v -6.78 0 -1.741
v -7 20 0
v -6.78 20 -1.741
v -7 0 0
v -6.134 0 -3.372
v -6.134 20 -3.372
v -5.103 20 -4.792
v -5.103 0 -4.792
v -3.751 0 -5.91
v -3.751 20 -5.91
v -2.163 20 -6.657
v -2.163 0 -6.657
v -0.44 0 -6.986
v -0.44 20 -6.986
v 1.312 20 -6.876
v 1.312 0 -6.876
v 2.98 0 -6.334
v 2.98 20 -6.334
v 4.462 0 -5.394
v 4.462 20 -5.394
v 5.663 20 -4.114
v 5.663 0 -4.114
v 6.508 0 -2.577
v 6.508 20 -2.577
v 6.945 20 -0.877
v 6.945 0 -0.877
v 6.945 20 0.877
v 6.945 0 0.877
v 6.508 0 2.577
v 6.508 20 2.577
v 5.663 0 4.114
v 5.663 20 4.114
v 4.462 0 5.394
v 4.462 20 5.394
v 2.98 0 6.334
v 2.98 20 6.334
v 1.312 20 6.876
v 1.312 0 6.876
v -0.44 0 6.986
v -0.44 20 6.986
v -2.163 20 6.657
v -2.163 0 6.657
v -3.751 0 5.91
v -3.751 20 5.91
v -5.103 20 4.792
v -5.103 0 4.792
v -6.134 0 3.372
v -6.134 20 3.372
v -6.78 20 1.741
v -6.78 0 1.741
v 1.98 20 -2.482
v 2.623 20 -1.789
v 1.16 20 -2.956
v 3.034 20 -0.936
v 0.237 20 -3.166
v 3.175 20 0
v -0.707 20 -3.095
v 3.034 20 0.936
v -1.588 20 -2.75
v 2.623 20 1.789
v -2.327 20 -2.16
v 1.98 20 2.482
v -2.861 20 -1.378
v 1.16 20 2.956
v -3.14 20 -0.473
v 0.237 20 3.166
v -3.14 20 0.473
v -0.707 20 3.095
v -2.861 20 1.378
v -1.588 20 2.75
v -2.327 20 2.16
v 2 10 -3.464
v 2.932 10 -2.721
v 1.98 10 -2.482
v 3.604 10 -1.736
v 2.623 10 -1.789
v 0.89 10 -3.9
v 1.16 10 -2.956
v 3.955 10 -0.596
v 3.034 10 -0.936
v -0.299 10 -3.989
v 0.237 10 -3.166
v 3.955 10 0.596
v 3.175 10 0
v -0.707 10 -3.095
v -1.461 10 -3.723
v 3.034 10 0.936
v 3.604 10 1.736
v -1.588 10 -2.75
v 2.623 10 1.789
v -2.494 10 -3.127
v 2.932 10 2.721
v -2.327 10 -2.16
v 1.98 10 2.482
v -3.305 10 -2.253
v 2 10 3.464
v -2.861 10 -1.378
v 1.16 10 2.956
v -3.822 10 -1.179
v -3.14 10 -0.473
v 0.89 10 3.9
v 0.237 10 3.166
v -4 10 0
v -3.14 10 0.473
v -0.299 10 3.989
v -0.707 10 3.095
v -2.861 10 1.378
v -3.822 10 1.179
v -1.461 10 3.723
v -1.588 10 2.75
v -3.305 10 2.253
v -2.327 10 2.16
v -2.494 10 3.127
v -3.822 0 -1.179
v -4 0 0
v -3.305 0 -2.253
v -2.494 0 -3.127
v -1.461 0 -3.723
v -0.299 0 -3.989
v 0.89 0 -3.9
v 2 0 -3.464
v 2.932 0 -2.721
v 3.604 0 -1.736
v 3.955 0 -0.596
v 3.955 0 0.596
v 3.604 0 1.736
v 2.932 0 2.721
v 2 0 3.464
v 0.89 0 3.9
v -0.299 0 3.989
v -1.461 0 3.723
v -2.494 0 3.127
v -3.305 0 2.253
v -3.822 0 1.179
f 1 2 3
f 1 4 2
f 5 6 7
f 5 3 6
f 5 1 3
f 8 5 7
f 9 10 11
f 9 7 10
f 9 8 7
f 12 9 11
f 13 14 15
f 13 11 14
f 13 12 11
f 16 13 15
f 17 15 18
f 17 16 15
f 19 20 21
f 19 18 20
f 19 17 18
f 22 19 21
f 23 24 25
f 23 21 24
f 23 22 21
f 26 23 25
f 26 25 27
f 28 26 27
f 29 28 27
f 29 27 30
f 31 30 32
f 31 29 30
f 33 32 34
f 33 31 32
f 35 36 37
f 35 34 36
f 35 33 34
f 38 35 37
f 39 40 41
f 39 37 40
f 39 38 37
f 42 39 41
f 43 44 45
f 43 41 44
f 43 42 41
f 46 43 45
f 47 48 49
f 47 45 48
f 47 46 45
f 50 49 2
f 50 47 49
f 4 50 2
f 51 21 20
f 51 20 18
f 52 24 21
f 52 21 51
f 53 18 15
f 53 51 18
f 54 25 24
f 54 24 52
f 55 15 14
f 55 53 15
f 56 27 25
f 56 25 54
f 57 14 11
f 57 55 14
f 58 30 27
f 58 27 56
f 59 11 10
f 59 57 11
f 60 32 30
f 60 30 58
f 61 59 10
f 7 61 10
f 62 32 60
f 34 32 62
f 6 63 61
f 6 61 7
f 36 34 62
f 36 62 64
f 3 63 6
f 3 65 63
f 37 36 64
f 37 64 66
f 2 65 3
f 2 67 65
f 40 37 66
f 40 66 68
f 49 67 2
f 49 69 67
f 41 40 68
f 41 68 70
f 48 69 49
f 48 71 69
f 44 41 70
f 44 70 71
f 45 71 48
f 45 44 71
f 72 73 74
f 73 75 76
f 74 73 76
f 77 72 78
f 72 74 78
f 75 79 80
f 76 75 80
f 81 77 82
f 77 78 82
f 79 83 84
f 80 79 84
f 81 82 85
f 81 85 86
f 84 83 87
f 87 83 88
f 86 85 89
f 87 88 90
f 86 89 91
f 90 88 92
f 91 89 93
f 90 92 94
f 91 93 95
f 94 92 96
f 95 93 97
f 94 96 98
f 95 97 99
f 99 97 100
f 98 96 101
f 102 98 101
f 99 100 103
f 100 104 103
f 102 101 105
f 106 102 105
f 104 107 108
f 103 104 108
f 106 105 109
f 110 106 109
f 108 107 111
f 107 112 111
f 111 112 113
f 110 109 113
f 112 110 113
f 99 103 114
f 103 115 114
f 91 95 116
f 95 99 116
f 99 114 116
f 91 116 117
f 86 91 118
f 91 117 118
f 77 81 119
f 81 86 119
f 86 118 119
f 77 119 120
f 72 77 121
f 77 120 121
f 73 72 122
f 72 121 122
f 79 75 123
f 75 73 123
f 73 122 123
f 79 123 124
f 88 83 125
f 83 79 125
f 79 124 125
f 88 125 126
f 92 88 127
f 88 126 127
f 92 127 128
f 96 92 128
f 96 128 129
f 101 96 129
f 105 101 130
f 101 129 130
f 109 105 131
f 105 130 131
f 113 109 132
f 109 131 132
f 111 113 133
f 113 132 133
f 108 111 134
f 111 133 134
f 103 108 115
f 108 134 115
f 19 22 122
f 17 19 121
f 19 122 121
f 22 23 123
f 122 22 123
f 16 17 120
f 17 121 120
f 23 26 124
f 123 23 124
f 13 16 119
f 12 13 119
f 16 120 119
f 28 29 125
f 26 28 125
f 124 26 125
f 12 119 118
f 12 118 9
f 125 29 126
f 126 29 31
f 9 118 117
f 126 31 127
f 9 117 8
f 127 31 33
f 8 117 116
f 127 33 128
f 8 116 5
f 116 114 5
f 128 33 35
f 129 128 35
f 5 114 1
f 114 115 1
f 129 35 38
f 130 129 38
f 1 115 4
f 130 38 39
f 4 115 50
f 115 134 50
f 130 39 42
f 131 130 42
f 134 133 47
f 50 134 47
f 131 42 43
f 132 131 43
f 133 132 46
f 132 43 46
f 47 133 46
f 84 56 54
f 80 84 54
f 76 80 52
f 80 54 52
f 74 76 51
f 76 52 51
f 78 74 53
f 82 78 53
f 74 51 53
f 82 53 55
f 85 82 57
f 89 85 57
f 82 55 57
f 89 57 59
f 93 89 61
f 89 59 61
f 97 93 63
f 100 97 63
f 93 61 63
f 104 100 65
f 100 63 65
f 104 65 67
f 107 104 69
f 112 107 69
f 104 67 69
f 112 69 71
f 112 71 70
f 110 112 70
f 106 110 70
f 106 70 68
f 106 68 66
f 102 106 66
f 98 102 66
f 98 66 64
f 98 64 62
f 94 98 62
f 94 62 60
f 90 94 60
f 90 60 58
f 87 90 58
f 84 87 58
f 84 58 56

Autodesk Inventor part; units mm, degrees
ref_plane "YZ Plane" through (0, 0, 0) normal (1, 0, 0) x (0, 1, 0)
ref_plane "XZ Plane" through (0, 0, 0) normal (0, 1, 0) x (-1, 0, 0)
ref_plane "XY Plane" through (0, 0, 0) normal (0, 0, 1) x (1, 0, 0)
sketch "Sketch1" plane through (0, 0, 0) normal (0, 1, 0) x (-1, 0, 0)
  circle A0 centre (0, 0) radius 4
  circle A1 centre (0, 0) radius 7
  dimension "d0" = 8
  dimension "d1" = 3
extrude "Extrusion1" add sketch "Sketch1" along normal blind 20 contours A0 | A1
sketch "Sketch2" plane through (0, 20, 0) normal (0, 1, 0) x (1, 0, 0)
  circle A0 centre (0, 0) radius 3.175
  dimension "d4" = 6.35
extrude "Extrusion2" cut sketch "Sketch2" against normal blind 10
extrude "Extrusion3" cut sketch "Sketch1" along normal blind 10 contours A0
properties part number "mixer_coupler"
